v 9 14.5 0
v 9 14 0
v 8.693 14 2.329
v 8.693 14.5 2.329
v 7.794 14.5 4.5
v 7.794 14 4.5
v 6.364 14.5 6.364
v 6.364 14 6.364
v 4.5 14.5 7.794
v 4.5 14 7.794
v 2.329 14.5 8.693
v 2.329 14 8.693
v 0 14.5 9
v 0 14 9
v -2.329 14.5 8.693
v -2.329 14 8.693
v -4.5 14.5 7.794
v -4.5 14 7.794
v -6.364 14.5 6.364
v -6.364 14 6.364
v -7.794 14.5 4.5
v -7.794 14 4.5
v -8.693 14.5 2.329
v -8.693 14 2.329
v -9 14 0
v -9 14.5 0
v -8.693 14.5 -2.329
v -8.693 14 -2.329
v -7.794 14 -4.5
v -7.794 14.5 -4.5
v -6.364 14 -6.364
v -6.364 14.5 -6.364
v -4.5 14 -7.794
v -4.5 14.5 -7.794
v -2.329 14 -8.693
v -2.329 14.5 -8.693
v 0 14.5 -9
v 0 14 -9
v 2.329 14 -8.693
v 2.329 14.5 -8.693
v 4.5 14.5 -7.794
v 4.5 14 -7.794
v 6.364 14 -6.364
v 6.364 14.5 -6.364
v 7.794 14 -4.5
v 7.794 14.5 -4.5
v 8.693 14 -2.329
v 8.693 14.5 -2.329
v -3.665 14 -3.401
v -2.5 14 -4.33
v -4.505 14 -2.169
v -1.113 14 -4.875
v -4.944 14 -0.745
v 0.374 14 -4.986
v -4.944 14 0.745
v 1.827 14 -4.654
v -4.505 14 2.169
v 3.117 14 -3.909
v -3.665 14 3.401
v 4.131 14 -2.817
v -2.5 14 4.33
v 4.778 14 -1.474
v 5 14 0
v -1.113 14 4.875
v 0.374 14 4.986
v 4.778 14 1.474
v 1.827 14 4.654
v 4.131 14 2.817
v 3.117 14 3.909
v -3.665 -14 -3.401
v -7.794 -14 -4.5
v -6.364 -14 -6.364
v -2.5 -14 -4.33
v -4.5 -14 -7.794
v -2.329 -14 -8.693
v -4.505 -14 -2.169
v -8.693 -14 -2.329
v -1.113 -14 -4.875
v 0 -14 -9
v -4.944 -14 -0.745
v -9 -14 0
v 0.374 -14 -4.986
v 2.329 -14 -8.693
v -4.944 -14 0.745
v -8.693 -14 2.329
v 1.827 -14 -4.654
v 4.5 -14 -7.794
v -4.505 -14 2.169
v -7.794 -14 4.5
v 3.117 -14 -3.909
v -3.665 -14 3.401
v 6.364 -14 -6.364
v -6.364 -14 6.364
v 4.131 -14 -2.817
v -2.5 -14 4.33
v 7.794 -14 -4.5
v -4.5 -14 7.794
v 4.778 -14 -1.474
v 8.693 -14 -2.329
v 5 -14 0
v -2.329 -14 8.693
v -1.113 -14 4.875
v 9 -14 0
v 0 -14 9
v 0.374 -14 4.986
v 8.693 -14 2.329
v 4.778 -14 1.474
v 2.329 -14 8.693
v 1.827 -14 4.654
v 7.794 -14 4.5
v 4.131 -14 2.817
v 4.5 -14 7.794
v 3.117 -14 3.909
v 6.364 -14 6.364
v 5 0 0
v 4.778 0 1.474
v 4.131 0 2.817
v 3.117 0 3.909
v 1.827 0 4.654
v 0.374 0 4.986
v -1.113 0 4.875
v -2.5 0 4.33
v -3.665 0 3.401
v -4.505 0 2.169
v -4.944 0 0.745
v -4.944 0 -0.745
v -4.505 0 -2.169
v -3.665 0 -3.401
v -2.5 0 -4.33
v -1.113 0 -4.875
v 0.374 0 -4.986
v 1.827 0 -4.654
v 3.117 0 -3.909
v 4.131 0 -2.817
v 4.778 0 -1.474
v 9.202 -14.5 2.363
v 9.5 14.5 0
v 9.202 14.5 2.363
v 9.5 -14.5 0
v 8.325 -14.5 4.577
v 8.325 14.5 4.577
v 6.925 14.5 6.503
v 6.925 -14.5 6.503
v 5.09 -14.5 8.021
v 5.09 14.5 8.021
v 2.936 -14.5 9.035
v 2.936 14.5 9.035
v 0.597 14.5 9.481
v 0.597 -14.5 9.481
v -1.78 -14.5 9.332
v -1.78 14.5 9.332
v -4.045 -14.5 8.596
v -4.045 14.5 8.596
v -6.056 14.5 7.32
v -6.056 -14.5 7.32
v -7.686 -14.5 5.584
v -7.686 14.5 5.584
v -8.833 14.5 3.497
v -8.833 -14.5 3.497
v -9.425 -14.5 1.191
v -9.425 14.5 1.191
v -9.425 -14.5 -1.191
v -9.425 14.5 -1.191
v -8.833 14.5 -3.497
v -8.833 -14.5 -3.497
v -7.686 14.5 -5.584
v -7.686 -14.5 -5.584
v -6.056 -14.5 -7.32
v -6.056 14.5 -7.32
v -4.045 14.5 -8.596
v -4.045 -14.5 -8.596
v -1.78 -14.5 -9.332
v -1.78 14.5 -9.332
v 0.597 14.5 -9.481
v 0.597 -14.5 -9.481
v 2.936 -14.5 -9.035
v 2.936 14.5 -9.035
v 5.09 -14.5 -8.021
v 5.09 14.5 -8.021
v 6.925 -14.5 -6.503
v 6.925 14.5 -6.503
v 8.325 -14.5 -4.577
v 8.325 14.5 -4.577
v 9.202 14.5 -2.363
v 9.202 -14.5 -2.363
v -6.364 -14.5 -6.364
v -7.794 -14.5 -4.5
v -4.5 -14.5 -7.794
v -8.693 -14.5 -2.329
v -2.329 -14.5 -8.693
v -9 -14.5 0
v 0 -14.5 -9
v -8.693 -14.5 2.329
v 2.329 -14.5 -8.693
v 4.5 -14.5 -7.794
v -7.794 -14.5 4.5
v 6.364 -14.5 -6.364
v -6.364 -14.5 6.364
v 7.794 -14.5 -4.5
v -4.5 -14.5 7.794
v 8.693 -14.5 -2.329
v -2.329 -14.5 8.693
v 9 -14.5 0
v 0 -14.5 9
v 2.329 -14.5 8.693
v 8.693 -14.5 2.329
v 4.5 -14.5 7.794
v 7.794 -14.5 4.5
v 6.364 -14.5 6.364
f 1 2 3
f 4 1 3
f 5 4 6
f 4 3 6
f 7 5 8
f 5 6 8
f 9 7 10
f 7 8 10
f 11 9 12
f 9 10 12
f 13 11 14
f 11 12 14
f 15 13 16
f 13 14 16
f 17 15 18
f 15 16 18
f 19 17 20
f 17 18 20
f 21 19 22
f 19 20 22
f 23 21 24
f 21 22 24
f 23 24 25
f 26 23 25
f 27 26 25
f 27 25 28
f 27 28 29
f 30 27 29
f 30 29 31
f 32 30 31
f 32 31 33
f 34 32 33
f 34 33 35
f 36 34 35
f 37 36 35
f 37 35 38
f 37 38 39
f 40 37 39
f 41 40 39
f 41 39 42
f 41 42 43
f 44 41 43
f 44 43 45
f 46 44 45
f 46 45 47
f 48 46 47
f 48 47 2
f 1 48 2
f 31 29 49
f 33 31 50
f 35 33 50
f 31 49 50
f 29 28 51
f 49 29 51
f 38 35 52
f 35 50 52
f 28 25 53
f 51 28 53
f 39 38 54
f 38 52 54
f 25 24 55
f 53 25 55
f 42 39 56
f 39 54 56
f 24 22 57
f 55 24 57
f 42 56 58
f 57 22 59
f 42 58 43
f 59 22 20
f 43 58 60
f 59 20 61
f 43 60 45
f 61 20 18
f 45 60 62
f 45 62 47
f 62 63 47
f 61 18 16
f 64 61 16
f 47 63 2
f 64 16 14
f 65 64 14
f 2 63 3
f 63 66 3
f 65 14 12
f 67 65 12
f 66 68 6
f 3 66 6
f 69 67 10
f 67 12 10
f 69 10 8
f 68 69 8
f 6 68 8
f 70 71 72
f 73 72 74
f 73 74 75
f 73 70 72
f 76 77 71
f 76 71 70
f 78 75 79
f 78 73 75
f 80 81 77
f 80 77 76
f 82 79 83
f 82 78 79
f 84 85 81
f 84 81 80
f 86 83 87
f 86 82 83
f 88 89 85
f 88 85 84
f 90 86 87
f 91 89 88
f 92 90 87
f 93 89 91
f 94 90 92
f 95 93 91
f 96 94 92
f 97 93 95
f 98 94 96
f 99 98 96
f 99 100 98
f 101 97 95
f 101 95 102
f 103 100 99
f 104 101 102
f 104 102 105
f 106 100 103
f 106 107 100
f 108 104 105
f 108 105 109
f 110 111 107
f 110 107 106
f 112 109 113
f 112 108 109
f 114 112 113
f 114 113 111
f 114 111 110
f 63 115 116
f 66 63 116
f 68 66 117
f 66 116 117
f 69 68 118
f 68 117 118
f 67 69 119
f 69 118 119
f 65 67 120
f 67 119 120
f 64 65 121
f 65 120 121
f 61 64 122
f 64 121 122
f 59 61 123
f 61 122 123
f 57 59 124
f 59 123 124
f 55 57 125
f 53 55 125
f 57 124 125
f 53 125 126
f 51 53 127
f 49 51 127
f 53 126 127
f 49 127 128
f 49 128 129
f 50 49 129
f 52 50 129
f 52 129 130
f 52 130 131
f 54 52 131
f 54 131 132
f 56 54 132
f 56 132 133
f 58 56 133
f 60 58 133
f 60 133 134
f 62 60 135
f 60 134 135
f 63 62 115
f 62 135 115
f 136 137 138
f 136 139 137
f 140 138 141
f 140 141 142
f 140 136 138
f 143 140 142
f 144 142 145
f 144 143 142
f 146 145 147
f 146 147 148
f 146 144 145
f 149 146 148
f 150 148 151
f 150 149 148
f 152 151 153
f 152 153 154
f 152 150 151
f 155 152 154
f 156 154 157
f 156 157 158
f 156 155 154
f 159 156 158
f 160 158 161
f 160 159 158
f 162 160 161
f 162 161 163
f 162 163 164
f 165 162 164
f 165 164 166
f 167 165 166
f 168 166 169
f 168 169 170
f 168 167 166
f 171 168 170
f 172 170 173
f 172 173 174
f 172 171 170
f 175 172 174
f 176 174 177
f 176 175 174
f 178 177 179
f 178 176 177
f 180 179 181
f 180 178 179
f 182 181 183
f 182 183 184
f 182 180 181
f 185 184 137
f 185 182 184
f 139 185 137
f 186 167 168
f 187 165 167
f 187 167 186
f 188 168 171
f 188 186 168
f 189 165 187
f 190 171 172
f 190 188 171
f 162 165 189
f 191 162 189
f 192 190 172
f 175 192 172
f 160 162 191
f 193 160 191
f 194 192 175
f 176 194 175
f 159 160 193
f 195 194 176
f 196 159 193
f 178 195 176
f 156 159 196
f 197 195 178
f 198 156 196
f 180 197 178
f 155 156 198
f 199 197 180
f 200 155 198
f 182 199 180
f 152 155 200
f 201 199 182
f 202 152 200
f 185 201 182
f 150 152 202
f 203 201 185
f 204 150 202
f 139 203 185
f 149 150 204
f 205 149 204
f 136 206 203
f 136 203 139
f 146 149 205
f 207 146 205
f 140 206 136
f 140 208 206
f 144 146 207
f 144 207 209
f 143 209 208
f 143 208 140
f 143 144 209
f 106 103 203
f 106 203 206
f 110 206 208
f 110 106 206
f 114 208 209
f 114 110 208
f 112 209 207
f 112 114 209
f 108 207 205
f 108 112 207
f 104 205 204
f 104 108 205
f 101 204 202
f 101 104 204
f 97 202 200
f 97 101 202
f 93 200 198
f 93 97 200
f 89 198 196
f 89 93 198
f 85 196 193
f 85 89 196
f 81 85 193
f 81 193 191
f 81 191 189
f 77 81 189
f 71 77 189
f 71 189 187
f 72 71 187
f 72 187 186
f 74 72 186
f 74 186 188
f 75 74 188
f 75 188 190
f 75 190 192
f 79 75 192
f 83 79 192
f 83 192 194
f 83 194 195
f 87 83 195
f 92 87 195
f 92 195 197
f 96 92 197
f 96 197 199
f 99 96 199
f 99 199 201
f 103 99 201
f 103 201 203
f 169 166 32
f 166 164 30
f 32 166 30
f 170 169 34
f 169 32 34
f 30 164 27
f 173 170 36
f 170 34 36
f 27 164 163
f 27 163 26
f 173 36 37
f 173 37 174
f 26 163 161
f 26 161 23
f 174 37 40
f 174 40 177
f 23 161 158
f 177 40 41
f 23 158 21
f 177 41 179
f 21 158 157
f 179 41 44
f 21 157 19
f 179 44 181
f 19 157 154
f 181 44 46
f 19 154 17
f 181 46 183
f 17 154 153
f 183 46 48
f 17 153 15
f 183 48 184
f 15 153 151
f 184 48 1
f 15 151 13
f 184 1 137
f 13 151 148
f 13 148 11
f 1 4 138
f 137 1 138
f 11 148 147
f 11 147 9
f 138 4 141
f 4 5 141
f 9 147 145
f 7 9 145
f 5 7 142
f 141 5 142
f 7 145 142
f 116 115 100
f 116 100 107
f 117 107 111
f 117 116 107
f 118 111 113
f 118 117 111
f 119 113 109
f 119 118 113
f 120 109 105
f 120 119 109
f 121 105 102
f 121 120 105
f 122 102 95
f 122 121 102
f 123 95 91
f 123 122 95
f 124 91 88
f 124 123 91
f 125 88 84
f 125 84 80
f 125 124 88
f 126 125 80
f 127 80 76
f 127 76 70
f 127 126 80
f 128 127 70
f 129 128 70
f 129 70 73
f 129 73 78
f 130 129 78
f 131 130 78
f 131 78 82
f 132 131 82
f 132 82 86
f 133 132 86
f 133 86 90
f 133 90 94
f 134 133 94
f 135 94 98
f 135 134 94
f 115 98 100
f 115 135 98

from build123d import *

# Parameters (mm, degrees)
F0_R          = 9
F0_R_2        = 5
F1_DEPTH      = 14
F1_DEPTH_BACK = 14
F0_R_3        = 9.5
F2_DEPTH      = 14.5
F2_DEPTH_BACK = 14.5


with BuildPart() as f1:
    # F0 (on Front) → F1 (new body, two sides)
    with BuildSketch(Plane.XZ) as f1_sk:
        Circle(F0_R)
        Circle(F0_R_2, mode=Mode.SUBTRACT)
    extrude(amount=F1_DEPTH)
    extrude(f1_sk.sketch, amount=-F1_DEPTH_BACK)

    # F0 (on Front) → F2 (join, two sides)
    with BuildSketch(Plane.XZ) as f2_sk:
        Circle(F0_R_3)
        Circle(F0_R, mode=Mode.SUBTRACT)
    extrude(amount=F2_DEPTH)
    extrude(f2_sk.sketch, amount=-F2_DEPTH_BACK)


solid = f1.part
